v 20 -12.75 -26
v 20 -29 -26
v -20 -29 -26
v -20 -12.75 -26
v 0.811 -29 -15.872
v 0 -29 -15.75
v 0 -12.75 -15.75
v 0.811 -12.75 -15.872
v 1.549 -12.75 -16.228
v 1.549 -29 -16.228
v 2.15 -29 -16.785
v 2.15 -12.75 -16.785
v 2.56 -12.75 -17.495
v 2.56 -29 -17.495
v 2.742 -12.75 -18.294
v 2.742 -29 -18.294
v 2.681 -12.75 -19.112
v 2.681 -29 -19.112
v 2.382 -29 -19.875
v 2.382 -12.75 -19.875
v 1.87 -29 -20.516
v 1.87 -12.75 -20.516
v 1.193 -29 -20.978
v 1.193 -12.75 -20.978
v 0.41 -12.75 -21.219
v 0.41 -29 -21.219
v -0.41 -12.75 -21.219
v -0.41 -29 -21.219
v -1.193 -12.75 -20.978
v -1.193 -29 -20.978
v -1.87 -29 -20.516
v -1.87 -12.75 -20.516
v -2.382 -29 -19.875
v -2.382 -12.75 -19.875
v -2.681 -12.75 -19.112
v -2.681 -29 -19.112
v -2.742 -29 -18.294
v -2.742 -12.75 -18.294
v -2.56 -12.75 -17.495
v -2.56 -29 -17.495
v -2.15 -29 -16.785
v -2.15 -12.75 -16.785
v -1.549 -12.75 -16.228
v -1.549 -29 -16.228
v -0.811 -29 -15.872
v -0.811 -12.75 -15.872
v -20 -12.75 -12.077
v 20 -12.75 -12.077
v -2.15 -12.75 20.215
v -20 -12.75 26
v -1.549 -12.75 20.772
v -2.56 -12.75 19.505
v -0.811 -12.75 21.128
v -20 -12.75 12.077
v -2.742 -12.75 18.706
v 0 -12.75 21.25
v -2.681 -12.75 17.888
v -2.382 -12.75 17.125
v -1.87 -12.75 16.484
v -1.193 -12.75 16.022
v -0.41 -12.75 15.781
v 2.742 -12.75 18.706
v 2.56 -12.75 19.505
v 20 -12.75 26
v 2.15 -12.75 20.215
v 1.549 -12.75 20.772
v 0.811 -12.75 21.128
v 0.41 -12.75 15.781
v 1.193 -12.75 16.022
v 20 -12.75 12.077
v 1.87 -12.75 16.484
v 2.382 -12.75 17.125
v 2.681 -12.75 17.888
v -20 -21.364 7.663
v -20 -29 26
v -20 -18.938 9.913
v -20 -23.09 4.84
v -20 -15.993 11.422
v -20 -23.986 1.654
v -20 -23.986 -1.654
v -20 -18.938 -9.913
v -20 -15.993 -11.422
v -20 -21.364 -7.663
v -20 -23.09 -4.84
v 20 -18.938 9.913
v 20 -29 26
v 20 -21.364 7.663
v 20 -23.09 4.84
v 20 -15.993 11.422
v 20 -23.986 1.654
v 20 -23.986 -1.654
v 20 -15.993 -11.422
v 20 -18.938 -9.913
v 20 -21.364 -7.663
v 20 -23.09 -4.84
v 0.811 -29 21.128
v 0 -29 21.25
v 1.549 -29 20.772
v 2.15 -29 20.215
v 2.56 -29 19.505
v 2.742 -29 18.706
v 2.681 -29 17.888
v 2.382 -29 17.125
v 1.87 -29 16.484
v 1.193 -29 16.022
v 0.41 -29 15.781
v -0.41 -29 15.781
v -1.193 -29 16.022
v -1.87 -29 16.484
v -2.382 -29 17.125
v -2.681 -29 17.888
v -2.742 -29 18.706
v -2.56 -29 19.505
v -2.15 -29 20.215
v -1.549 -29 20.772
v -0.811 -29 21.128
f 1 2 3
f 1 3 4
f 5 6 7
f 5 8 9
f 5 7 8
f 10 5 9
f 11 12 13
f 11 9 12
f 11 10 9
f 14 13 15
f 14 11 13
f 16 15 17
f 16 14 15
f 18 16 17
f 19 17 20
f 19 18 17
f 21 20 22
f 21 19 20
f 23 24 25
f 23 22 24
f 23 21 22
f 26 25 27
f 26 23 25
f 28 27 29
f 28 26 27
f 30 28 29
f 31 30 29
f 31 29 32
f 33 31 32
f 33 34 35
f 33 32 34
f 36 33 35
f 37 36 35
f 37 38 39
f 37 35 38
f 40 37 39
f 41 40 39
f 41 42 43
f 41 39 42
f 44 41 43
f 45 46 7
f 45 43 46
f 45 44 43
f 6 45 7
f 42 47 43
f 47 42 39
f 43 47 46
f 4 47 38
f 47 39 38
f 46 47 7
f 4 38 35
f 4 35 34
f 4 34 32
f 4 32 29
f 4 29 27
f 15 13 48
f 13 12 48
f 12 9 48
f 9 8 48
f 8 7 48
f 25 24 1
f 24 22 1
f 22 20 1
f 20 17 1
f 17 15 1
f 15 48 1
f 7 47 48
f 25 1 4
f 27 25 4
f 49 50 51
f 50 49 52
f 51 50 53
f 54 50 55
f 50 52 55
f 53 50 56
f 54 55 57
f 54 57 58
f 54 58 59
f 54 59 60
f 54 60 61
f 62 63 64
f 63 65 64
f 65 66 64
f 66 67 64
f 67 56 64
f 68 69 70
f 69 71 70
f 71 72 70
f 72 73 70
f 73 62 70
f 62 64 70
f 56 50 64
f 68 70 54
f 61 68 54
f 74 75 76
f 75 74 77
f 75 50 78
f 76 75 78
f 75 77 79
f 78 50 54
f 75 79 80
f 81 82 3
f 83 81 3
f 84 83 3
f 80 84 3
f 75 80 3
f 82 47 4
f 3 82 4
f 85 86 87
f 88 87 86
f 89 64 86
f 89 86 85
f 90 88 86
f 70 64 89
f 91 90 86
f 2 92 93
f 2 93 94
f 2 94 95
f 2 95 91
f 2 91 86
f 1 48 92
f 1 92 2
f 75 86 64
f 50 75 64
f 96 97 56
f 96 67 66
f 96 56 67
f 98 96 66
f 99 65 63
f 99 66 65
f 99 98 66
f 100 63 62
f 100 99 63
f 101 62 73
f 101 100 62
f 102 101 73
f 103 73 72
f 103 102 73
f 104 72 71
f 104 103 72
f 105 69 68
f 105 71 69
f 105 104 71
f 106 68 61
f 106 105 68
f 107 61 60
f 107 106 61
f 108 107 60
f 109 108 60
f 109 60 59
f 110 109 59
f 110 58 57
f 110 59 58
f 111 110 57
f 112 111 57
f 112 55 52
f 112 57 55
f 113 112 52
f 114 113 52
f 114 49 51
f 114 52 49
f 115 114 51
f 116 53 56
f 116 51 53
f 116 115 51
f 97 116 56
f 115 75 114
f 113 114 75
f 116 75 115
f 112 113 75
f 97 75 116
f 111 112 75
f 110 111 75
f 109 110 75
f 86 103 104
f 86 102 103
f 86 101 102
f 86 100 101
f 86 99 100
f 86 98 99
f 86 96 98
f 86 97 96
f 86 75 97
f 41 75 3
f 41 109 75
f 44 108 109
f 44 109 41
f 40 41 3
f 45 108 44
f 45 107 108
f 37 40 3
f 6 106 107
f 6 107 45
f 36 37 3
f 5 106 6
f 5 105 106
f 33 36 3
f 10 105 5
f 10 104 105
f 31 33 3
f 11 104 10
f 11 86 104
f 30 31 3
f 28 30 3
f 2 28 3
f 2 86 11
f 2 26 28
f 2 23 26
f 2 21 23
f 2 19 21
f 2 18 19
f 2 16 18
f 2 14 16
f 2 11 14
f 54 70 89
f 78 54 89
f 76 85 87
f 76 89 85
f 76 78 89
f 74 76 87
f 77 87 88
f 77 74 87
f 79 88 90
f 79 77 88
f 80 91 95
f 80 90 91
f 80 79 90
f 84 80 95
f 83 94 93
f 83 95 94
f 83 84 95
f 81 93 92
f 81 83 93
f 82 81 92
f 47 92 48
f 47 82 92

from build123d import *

# Parameters (mm, degrees)
SKETCH1_W                     = 52
SKETCH1_H                     = 16.25
CLAMP_LOWER_HALF_DEPTH        = 20
HANDLEBAR_BORE_DEPTH          = 44.783558558
HANDLEBAR_BORE_DEPTH_BACK     = 44.783558558
SKETCH2_R                     = 12.1
M5_CLEARANCE_HOLES_DEPTH      = 44.783558558
M5_CLEARANCE_HOLES_DEPTH_BACK = 44.783558558
SKETCH3_R                     = 2.75


with BuildPart() as part:
    # Sketch1 → Clamp Lower Half (new, symmetric)
    with BuildSketch(Plane(origin=(0, 0, 0), x_dir=(0, 0, -1), z_dir=(1, 0, 0))):
        with Locations((0, -20.875)):
            Rectangle(SKETCH1_W, SKETCH1_H)
    extrude(amount=CLAMP_LOWER_HALF_DEPTH, both=True)

    # Sketch2 → Handlebar Bore (cut, two sides: drawn at the far end of the back side and taken through both)
    with BuildSketch(Plane(origin=(0, 0, 0), x_dir=(0, 0, -1), z_dir=(1, 0, 0)).offset(-HANDLEBAR_BORE_DEPTH_BACK)):
        with Locations((0, -12)):
            Circle(SKETCH2_R)
    extrude(amount=HANDLEBAR_BORE_DEPTH + HANDLEBAR_BORE_DEPTH_BACK, mode=Mode.SUBTRACT)

    # Sketch3 → M5 Clearance Holes (cut, two sides: drawn at the far end of the back side and taken through both)
    with BuildSketch(Plane(origin=(0, 0, 0), x_dir=(1, 0, 0), z_dir=(0, 1, 0)).offset(-M5_CLEARANCE_HOLES_DEPTH_BACK)):
        with Locations(Location((0, -18.5, 0), (0, 0, 270))):
            Circle(SKETCH3_R)
        with Locations(Location((0, 18.5, 0), (0, 0, 270))):
            Circle(SKETCH3_R)
    extrude(amount=M5_CLEARANCE_HOLES_DEPTH + M5_CLEARANCE_HOLES_DEPTH_BACK, mode=Mode.SUBTRACT)


solid = part.part
